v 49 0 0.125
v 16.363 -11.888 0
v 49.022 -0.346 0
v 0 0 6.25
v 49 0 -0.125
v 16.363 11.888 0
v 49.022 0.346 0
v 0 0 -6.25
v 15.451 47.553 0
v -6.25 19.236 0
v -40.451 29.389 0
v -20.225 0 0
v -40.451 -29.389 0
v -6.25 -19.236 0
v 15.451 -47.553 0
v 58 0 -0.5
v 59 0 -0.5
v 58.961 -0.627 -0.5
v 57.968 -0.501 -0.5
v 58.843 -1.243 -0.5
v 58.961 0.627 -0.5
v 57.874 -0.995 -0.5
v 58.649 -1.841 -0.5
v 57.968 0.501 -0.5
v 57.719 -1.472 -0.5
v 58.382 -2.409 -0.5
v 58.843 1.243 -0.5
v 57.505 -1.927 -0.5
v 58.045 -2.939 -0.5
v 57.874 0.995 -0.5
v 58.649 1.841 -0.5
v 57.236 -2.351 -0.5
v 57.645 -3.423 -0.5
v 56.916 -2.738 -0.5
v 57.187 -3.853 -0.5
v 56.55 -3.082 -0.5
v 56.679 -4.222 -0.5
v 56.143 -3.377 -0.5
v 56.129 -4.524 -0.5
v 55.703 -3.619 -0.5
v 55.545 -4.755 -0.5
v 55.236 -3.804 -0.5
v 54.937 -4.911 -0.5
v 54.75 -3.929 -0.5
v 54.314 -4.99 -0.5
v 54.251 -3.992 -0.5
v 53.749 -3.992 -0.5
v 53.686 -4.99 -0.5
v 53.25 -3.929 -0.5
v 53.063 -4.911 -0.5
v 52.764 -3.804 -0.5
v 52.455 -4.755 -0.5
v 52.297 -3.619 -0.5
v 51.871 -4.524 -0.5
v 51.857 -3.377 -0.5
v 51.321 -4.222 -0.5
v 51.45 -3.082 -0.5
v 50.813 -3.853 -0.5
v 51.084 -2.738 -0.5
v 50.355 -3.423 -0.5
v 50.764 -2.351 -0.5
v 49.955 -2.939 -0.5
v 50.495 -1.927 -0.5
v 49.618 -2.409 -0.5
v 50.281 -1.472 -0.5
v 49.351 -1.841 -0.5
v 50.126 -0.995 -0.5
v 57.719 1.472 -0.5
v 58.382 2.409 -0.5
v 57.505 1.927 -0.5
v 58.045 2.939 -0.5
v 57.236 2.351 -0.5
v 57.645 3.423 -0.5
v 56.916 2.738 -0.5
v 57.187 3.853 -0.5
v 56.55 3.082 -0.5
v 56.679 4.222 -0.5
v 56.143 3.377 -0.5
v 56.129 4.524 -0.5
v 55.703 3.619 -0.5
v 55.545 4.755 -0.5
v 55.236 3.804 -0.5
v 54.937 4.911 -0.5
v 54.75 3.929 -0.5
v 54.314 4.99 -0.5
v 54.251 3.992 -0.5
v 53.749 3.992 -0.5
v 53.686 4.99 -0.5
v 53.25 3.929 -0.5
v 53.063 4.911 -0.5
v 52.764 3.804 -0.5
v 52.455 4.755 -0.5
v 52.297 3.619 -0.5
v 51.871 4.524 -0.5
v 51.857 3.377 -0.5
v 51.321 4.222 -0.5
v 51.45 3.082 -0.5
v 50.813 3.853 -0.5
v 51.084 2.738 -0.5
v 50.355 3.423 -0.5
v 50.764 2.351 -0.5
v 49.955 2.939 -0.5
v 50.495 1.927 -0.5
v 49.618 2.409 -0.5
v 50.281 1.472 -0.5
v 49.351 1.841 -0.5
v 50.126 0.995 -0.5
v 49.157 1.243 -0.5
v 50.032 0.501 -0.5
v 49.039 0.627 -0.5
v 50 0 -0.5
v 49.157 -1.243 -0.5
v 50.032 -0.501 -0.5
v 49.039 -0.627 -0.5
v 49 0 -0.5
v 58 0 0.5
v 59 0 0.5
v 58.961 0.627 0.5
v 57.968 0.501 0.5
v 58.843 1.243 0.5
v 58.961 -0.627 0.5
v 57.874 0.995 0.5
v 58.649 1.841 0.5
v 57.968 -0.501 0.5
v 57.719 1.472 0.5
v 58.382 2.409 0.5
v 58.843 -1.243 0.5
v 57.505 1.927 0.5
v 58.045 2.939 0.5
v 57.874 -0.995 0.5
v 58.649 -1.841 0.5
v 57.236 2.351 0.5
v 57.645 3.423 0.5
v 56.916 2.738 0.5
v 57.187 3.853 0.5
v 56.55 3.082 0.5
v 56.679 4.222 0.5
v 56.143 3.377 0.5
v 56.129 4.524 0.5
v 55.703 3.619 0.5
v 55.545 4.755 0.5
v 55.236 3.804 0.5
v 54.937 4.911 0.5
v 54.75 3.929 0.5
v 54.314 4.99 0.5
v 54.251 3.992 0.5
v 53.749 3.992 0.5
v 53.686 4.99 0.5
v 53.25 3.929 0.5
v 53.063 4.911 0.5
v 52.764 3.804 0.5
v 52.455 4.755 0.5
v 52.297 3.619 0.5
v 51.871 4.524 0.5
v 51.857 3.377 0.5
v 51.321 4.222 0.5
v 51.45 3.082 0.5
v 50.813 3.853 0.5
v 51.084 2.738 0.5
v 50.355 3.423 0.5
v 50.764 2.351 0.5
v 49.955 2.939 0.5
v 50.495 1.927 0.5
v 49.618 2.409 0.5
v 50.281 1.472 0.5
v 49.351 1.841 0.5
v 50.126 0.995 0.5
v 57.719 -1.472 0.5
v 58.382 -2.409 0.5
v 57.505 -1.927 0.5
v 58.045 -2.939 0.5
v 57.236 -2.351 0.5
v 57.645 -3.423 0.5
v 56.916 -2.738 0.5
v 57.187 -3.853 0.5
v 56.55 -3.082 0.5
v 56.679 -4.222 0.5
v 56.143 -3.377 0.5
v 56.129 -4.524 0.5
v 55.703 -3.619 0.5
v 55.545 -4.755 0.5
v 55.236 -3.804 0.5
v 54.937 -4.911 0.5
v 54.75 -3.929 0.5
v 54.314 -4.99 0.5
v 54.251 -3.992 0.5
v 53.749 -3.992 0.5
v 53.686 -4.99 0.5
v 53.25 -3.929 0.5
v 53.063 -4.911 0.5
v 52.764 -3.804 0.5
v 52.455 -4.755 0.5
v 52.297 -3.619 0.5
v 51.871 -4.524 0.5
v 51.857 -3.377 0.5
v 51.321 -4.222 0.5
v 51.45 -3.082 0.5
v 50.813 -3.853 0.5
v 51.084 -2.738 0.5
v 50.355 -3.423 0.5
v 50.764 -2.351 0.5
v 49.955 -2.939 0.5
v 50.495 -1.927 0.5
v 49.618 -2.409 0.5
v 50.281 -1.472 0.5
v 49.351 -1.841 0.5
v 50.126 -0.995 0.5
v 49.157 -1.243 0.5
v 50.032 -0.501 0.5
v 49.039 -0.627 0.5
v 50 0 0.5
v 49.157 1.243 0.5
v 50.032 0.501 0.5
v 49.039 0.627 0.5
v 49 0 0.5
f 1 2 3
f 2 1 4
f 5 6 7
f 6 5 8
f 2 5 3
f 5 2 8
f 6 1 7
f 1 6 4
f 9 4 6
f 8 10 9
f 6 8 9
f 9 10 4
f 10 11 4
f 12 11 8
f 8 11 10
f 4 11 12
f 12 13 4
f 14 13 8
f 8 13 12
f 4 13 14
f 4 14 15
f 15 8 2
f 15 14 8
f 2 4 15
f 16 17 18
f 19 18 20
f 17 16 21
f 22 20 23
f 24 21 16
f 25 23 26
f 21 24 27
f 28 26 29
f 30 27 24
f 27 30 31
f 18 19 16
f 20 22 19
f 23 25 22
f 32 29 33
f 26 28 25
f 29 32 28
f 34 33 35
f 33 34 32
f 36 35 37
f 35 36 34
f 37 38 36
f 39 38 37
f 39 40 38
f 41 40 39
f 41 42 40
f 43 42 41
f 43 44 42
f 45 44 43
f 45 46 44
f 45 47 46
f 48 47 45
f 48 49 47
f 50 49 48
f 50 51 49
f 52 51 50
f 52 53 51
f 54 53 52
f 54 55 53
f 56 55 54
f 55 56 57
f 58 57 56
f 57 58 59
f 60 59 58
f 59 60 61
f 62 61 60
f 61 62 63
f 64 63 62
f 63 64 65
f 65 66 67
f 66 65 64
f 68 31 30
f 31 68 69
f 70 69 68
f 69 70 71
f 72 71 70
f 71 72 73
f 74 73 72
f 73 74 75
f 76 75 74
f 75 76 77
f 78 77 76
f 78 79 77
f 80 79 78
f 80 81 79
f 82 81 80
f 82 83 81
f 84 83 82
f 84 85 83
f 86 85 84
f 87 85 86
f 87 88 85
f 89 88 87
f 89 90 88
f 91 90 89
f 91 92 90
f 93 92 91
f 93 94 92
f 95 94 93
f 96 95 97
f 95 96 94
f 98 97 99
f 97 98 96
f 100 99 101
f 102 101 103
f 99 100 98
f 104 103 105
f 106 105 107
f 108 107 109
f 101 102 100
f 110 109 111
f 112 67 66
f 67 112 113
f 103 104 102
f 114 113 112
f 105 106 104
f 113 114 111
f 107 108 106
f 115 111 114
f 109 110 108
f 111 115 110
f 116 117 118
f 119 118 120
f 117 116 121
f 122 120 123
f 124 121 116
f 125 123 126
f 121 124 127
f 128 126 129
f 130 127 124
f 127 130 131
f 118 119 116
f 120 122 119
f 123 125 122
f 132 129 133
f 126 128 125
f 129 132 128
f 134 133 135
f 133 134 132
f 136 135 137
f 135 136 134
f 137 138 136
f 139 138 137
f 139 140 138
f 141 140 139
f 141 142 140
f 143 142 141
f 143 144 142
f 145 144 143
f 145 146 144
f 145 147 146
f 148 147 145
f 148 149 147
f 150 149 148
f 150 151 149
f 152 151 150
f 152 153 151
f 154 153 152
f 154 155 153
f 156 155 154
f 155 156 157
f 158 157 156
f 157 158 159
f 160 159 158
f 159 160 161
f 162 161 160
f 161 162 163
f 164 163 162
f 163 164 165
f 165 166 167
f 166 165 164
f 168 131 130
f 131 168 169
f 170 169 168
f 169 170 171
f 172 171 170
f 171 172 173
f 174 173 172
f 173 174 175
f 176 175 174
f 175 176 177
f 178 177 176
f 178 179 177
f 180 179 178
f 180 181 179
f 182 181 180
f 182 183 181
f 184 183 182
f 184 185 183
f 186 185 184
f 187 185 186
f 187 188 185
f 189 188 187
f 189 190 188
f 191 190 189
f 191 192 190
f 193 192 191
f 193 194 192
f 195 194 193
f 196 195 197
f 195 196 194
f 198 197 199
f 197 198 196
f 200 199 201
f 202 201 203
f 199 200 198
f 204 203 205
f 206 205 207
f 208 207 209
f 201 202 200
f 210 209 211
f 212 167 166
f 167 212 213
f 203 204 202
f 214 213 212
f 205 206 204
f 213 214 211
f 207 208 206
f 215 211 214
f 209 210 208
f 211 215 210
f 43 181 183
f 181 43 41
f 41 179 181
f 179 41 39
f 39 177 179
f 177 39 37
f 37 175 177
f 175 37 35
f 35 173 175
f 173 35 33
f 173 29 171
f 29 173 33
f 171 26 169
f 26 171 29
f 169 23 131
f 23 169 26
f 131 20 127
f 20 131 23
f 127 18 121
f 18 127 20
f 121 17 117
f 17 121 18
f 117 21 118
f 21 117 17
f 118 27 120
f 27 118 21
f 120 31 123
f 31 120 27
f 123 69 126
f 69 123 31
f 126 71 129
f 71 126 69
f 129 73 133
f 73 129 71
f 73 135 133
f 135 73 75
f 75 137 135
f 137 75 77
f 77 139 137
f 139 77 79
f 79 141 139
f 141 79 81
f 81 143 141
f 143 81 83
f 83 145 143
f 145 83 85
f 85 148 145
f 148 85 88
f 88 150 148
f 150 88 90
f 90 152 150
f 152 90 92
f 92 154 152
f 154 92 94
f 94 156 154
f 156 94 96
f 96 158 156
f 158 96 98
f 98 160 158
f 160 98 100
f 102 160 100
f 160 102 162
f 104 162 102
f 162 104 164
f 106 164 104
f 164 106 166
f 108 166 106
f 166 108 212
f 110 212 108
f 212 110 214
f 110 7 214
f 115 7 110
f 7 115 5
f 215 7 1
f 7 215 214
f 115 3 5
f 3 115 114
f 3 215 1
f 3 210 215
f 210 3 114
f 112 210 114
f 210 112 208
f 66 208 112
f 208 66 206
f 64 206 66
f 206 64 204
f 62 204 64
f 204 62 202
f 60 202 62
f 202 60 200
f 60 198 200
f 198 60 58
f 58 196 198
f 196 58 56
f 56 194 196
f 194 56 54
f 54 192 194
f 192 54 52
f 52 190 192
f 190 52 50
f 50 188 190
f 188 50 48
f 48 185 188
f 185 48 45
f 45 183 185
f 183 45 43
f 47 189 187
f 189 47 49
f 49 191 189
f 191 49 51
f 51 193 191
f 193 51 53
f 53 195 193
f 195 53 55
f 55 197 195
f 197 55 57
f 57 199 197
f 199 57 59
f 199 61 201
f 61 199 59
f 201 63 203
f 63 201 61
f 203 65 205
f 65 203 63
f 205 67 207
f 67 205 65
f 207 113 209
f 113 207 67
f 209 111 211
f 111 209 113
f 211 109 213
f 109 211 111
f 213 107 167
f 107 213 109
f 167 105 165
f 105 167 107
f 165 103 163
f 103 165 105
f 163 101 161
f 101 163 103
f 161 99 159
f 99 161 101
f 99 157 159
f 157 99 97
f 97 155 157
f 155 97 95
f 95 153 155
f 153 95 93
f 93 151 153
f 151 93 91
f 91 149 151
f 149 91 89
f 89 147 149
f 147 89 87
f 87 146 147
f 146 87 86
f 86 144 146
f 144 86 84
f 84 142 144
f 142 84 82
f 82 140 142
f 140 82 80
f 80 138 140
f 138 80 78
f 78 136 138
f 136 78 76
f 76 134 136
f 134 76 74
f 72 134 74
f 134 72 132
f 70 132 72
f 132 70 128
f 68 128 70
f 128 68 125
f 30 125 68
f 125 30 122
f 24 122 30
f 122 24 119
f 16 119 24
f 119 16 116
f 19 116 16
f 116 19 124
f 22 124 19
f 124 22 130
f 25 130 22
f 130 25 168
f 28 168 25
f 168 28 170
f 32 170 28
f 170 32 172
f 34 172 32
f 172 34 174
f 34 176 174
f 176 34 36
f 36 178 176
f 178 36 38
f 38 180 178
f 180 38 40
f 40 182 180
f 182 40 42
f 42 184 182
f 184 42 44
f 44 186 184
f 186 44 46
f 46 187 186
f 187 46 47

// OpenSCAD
number_of_points = 5; // [4:50]
// Diameter of the star in mm: 
size = 100; // [10:500]
// How much longer than the body should the points of the star be?
point_to_body_ratio = 2.0; // [1.0:5.0]

module ring(radius, rHeight)
{
	linear_extrude(height = rHeight, center = true)
	{
		difference()
		{
			circle(radius, $fn=50);
			circle(radius-rHeight, $fn=50); 
		}// preview[view:south, tilt:top]
	}
}

module star(bodyRadius, numberOfPoints, pointRadius, height)
{
	for (i = [0:numberOfPoints])
	{
		rotate(i*(360/numberOfPoints))
		{
			polyhedron ( points = [[0, 0, height/2], [0, 0, -height/2], [cos(360/numberOfPoints)*bodyRadius, sin(360/numberOfPoints)*bodyRadius, 0], [cos(360-360/numberOfPoints)*bodyRadius, sin(360-360/numberOfPoints)*bodyRadius, 0], [pointRadius, 0, 0]], triangles = [[3,0,4], [0,2,4], [2,1,4], [1,3,4], [0,3,1], [2,0,1],]);
		}
	}
}

module starWithRing(bodyRadius, numberOfPoints, pointRadius, height, ringRadius)
{
	union()
	{
		star(bodyRadius, numberOfPoints, pointRadius, height);
		translate([pointRadius + ringRadius - 1,0,0])
		{
			ring(ringRadius,1);
		}
	}
}
 
if (size < 30)
{
	star(size/(1.0 + point_to_body_ratio)/2, number_of_points, size/2, size/8);
}
else
{
	starWithRing(size/(1.0 + point_to_body_ratio)/2, number_of_points, size/2, size/8, 5);
}
